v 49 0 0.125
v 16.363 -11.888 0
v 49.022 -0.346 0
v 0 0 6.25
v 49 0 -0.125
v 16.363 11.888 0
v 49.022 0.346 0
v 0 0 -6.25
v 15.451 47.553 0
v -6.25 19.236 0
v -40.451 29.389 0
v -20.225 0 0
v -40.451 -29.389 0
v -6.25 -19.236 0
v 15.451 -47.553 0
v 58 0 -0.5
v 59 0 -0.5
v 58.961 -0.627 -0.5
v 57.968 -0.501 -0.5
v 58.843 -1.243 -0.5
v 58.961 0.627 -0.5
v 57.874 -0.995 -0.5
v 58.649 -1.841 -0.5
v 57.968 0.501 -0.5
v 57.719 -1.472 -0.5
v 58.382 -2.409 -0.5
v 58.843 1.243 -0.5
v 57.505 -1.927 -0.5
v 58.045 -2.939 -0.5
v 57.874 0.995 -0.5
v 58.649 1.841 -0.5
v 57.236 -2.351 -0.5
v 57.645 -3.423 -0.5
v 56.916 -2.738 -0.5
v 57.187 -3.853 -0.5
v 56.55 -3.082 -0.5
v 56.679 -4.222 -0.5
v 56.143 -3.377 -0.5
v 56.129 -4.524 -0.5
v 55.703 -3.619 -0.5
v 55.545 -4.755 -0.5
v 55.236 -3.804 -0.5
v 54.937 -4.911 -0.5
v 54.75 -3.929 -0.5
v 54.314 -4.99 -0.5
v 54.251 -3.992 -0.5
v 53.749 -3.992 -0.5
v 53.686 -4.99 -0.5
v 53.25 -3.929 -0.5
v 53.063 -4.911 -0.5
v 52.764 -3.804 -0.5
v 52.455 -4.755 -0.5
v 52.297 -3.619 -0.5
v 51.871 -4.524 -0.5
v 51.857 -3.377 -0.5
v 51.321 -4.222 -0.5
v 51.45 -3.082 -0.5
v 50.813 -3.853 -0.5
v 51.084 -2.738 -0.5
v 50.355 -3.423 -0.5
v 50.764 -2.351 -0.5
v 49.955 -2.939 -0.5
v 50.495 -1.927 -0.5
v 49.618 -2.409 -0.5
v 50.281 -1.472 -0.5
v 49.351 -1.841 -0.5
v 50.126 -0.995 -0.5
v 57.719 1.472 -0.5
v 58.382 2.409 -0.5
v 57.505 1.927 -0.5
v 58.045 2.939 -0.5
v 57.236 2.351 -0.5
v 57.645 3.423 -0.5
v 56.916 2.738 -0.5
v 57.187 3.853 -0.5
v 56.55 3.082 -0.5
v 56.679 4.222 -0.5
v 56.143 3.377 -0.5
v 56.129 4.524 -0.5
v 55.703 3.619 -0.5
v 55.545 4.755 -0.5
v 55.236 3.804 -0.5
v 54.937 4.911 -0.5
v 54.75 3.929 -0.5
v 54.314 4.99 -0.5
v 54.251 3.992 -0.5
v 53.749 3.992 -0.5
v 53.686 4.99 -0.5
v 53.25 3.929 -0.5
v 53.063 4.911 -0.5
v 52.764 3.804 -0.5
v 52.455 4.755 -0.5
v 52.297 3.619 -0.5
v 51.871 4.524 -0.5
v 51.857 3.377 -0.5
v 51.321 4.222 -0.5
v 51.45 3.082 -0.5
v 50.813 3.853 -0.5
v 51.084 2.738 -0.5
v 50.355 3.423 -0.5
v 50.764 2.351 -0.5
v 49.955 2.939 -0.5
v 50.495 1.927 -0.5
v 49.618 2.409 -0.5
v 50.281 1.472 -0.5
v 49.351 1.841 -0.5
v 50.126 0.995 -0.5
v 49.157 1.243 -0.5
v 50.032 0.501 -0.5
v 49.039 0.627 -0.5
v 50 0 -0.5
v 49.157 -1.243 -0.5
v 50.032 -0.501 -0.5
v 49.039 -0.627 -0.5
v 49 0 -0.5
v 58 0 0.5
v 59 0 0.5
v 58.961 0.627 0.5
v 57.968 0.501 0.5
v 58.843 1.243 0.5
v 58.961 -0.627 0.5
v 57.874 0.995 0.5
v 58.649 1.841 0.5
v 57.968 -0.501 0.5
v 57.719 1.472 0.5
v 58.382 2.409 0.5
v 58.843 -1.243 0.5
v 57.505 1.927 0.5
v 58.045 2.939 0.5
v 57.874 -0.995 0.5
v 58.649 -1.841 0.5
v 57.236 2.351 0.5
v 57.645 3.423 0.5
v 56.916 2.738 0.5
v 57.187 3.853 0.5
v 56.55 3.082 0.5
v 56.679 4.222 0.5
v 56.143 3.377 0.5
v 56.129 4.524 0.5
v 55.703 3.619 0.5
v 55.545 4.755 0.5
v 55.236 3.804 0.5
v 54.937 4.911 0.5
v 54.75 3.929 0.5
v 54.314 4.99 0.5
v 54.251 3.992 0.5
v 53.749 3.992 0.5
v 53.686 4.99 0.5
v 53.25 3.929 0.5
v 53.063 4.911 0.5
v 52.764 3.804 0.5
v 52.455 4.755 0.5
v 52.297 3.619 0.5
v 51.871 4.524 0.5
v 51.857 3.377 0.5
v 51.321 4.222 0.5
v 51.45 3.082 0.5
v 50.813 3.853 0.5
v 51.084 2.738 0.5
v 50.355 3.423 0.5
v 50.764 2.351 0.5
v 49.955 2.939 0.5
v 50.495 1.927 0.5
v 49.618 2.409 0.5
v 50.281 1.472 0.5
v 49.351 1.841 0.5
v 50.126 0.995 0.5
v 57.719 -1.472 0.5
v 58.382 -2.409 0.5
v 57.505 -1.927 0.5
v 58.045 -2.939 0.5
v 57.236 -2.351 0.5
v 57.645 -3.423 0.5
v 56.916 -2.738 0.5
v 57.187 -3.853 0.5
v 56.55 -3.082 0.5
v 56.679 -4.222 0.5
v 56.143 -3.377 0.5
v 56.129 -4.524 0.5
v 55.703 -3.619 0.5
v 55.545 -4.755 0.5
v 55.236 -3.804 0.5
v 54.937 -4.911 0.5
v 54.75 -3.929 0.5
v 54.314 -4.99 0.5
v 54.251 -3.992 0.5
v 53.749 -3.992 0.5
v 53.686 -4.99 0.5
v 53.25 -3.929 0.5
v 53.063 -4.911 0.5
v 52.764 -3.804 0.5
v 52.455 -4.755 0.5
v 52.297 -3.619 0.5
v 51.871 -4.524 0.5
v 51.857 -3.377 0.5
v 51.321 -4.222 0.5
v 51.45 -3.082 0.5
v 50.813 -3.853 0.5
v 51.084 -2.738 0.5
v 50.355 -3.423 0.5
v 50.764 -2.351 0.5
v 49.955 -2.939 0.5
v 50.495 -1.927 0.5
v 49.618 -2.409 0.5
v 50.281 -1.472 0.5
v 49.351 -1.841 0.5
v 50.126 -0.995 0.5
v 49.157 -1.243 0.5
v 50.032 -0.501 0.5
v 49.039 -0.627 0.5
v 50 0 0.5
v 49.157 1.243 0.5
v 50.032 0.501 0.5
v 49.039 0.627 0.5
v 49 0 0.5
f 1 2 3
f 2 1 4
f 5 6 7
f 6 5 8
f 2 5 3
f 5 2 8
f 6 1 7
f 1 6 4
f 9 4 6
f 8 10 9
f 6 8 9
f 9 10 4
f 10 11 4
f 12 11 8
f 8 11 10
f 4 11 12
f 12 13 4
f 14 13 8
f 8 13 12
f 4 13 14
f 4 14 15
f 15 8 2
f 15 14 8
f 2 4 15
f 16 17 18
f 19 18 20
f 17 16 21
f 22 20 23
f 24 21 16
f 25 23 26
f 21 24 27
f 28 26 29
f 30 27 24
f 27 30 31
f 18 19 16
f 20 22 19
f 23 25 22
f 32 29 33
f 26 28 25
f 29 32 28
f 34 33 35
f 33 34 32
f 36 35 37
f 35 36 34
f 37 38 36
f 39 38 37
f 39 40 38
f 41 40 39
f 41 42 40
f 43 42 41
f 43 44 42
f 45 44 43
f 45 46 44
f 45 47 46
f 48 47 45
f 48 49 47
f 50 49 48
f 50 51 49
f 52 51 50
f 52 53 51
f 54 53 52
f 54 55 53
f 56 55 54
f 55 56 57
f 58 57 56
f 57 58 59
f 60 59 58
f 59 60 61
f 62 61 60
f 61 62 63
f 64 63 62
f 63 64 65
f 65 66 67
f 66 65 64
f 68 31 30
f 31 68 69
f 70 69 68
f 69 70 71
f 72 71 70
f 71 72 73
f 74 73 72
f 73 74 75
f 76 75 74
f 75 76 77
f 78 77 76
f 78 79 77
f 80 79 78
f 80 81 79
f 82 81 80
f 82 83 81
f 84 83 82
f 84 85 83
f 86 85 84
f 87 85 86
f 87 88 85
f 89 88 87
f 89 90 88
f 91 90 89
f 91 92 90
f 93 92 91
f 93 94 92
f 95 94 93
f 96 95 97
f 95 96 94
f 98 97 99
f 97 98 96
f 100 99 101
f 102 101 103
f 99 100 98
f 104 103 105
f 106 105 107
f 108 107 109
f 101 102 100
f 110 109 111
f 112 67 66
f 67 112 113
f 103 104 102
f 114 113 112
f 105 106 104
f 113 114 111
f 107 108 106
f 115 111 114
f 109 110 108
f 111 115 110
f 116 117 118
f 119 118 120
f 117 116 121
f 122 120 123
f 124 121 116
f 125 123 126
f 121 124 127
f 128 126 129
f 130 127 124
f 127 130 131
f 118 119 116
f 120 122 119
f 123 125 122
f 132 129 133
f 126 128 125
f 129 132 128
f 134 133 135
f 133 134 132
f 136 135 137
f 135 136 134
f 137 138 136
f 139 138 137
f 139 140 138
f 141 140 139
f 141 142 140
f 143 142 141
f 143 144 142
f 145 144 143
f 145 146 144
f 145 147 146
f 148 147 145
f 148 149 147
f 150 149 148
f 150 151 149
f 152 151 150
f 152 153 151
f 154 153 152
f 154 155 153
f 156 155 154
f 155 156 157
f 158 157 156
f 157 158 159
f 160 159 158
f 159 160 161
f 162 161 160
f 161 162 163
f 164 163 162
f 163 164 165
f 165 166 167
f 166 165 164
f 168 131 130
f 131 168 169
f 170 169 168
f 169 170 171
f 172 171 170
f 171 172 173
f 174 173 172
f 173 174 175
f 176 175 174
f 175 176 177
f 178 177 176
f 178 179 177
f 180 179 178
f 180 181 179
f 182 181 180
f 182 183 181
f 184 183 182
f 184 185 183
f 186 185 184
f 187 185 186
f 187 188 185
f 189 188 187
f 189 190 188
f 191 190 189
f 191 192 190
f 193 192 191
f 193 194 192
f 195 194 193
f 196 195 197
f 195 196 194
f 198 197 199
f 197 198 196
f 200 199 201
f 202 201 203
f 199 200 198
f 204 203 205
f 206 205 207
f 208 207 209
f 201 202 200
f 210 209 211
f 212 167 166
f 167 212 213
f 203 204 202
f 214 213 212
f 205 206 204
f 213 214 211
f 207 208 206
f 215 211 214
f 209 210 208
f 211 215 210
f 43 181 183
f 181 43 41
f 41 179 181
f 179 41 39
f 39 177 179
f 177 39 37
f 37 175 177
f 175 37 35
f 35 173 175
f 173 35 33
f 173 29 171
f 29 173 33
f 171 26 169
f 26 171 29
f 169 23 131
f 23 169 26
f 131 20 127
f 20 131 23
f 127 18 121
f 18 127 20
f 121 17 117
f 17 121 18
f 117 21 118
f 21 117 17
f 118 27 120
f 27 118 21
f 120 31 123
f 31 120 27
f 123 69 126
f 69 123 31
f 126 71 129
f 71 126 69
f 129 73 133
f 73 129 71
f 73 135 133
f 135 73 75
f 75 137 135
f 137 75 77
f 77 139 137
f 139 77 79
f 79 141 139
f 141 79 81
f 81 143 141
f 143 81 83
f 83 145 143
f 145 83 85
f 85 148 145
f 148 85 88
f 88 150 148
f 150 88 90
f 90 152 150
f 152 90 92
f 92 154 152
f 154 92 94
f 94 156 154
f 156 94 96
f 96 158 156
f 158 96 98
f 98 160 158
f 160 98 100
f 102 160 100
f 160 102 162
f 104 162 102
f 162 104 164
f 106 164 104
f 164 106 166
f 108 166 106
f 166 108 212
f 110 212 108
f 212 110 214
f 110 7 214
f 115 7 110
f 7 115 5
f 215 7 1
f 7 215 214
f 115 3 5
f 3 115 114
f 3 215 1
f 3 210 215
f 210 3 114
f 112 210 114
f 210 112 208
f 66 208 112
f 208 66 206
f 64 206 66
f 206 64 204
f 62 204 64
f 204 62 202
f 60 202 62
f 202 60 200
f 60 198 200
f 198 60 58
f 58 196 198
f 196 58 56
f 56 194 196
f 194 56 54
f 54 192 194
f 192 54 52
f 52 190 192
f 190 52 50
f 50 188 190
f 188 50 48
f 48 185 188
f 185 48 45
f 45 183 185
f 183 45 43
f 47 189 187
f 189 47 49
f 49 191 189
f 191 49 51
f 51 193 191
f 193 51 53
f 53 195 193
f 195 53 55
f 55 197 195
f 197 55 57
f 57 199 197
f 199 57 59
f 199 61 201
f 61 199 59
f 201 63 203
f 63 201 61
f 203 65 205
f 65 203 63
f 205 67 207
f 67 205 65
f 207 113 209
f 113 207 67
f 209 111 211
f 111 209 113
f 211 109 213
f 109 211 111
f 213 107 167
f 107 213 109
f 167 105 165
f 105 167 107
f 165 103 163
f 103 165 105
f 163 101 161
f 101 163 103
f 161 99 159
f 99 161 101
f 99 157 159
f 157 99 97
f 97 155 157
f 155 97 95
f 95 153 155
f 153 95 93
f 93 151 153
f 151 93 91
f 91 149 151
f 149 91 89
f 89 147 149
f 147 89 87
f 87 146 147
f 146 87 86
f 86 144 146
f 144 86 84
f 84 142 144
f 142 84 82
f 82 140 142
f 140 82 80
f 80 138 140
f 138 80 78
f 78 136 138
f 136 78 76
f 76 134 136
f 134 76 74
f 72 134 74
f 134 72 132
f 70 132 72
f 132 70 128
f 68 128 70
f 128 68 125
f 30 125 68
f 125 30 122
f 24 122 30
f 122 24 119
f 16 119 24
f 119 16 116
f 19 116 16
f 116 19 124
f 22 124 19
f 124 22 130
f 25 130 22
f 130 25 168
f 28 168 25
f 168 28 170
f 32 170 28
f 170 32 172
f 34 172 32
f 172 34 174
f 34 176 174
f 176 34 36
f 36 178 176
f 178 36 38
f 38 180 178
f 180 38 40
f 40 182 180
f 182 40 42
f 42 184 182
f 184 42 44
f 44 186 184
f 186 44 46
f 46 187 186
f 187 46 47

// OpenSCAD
number_of_points = 5; // [4:50]
// Diameter of the star in mm: 
size = 100; // [10:500]
// How much longer than the body should the points of the star be?
point_to_body_ratio = 2.0; // [1.0:5.0]

module ring(radius, rHeight)
{
	linear_extrude(height = rHeight, center = true)
	{
		difference()
		{
			circle(radius, $fn=50);
			circle(radius-rHeight, $fn=50); 
		}// preview[view:south, tilt:top]
	}
}

module star(bodyRadius, numberOfPoints, pointRadius, height)
{
	for (i = [0:numberOfPoints])
	{
		rotate(i*(360/numberOfPoints))
		{
			polyhedron ( points = [[0, 0, height/2], [0, 0, -height/2], [cos(360/numberOfPoints)*bodyRadius, sin(360/numberOfPoints)*bodyRadius, 0], [cos(360-360/numberOfPoints)*bodyRadius, sin(360-360/numberOfPoints)*bodyRadius, 0], [pointRadius, 0, 0]], triangles = [[3,0,4], [0,2,4], [2,1,4], [1,3,4], [0,3,1], [2,0,1],]);
		}
	}
}

module starWithRing(bodyRadius, numberOfPoints, pointRadius, height, ringRadius)
{
	union()
	{
		star(bodyRadius, numberOfPoints, pointRadius, height);
		translate([pointRadius + ringRadius - 1,0,0])
		{
			ring(ringRadius,1);
		}
	}
}
 
if (size < 30)
{
	star(size/(1.0 + point_to_body_ratio)/2, number_of_points, size/2, size/8);
}
else
{
	starWithRing(size/(1.0 + point_to_body_ratio)/2, number_of_points, size/2, size/8, 5);
}
